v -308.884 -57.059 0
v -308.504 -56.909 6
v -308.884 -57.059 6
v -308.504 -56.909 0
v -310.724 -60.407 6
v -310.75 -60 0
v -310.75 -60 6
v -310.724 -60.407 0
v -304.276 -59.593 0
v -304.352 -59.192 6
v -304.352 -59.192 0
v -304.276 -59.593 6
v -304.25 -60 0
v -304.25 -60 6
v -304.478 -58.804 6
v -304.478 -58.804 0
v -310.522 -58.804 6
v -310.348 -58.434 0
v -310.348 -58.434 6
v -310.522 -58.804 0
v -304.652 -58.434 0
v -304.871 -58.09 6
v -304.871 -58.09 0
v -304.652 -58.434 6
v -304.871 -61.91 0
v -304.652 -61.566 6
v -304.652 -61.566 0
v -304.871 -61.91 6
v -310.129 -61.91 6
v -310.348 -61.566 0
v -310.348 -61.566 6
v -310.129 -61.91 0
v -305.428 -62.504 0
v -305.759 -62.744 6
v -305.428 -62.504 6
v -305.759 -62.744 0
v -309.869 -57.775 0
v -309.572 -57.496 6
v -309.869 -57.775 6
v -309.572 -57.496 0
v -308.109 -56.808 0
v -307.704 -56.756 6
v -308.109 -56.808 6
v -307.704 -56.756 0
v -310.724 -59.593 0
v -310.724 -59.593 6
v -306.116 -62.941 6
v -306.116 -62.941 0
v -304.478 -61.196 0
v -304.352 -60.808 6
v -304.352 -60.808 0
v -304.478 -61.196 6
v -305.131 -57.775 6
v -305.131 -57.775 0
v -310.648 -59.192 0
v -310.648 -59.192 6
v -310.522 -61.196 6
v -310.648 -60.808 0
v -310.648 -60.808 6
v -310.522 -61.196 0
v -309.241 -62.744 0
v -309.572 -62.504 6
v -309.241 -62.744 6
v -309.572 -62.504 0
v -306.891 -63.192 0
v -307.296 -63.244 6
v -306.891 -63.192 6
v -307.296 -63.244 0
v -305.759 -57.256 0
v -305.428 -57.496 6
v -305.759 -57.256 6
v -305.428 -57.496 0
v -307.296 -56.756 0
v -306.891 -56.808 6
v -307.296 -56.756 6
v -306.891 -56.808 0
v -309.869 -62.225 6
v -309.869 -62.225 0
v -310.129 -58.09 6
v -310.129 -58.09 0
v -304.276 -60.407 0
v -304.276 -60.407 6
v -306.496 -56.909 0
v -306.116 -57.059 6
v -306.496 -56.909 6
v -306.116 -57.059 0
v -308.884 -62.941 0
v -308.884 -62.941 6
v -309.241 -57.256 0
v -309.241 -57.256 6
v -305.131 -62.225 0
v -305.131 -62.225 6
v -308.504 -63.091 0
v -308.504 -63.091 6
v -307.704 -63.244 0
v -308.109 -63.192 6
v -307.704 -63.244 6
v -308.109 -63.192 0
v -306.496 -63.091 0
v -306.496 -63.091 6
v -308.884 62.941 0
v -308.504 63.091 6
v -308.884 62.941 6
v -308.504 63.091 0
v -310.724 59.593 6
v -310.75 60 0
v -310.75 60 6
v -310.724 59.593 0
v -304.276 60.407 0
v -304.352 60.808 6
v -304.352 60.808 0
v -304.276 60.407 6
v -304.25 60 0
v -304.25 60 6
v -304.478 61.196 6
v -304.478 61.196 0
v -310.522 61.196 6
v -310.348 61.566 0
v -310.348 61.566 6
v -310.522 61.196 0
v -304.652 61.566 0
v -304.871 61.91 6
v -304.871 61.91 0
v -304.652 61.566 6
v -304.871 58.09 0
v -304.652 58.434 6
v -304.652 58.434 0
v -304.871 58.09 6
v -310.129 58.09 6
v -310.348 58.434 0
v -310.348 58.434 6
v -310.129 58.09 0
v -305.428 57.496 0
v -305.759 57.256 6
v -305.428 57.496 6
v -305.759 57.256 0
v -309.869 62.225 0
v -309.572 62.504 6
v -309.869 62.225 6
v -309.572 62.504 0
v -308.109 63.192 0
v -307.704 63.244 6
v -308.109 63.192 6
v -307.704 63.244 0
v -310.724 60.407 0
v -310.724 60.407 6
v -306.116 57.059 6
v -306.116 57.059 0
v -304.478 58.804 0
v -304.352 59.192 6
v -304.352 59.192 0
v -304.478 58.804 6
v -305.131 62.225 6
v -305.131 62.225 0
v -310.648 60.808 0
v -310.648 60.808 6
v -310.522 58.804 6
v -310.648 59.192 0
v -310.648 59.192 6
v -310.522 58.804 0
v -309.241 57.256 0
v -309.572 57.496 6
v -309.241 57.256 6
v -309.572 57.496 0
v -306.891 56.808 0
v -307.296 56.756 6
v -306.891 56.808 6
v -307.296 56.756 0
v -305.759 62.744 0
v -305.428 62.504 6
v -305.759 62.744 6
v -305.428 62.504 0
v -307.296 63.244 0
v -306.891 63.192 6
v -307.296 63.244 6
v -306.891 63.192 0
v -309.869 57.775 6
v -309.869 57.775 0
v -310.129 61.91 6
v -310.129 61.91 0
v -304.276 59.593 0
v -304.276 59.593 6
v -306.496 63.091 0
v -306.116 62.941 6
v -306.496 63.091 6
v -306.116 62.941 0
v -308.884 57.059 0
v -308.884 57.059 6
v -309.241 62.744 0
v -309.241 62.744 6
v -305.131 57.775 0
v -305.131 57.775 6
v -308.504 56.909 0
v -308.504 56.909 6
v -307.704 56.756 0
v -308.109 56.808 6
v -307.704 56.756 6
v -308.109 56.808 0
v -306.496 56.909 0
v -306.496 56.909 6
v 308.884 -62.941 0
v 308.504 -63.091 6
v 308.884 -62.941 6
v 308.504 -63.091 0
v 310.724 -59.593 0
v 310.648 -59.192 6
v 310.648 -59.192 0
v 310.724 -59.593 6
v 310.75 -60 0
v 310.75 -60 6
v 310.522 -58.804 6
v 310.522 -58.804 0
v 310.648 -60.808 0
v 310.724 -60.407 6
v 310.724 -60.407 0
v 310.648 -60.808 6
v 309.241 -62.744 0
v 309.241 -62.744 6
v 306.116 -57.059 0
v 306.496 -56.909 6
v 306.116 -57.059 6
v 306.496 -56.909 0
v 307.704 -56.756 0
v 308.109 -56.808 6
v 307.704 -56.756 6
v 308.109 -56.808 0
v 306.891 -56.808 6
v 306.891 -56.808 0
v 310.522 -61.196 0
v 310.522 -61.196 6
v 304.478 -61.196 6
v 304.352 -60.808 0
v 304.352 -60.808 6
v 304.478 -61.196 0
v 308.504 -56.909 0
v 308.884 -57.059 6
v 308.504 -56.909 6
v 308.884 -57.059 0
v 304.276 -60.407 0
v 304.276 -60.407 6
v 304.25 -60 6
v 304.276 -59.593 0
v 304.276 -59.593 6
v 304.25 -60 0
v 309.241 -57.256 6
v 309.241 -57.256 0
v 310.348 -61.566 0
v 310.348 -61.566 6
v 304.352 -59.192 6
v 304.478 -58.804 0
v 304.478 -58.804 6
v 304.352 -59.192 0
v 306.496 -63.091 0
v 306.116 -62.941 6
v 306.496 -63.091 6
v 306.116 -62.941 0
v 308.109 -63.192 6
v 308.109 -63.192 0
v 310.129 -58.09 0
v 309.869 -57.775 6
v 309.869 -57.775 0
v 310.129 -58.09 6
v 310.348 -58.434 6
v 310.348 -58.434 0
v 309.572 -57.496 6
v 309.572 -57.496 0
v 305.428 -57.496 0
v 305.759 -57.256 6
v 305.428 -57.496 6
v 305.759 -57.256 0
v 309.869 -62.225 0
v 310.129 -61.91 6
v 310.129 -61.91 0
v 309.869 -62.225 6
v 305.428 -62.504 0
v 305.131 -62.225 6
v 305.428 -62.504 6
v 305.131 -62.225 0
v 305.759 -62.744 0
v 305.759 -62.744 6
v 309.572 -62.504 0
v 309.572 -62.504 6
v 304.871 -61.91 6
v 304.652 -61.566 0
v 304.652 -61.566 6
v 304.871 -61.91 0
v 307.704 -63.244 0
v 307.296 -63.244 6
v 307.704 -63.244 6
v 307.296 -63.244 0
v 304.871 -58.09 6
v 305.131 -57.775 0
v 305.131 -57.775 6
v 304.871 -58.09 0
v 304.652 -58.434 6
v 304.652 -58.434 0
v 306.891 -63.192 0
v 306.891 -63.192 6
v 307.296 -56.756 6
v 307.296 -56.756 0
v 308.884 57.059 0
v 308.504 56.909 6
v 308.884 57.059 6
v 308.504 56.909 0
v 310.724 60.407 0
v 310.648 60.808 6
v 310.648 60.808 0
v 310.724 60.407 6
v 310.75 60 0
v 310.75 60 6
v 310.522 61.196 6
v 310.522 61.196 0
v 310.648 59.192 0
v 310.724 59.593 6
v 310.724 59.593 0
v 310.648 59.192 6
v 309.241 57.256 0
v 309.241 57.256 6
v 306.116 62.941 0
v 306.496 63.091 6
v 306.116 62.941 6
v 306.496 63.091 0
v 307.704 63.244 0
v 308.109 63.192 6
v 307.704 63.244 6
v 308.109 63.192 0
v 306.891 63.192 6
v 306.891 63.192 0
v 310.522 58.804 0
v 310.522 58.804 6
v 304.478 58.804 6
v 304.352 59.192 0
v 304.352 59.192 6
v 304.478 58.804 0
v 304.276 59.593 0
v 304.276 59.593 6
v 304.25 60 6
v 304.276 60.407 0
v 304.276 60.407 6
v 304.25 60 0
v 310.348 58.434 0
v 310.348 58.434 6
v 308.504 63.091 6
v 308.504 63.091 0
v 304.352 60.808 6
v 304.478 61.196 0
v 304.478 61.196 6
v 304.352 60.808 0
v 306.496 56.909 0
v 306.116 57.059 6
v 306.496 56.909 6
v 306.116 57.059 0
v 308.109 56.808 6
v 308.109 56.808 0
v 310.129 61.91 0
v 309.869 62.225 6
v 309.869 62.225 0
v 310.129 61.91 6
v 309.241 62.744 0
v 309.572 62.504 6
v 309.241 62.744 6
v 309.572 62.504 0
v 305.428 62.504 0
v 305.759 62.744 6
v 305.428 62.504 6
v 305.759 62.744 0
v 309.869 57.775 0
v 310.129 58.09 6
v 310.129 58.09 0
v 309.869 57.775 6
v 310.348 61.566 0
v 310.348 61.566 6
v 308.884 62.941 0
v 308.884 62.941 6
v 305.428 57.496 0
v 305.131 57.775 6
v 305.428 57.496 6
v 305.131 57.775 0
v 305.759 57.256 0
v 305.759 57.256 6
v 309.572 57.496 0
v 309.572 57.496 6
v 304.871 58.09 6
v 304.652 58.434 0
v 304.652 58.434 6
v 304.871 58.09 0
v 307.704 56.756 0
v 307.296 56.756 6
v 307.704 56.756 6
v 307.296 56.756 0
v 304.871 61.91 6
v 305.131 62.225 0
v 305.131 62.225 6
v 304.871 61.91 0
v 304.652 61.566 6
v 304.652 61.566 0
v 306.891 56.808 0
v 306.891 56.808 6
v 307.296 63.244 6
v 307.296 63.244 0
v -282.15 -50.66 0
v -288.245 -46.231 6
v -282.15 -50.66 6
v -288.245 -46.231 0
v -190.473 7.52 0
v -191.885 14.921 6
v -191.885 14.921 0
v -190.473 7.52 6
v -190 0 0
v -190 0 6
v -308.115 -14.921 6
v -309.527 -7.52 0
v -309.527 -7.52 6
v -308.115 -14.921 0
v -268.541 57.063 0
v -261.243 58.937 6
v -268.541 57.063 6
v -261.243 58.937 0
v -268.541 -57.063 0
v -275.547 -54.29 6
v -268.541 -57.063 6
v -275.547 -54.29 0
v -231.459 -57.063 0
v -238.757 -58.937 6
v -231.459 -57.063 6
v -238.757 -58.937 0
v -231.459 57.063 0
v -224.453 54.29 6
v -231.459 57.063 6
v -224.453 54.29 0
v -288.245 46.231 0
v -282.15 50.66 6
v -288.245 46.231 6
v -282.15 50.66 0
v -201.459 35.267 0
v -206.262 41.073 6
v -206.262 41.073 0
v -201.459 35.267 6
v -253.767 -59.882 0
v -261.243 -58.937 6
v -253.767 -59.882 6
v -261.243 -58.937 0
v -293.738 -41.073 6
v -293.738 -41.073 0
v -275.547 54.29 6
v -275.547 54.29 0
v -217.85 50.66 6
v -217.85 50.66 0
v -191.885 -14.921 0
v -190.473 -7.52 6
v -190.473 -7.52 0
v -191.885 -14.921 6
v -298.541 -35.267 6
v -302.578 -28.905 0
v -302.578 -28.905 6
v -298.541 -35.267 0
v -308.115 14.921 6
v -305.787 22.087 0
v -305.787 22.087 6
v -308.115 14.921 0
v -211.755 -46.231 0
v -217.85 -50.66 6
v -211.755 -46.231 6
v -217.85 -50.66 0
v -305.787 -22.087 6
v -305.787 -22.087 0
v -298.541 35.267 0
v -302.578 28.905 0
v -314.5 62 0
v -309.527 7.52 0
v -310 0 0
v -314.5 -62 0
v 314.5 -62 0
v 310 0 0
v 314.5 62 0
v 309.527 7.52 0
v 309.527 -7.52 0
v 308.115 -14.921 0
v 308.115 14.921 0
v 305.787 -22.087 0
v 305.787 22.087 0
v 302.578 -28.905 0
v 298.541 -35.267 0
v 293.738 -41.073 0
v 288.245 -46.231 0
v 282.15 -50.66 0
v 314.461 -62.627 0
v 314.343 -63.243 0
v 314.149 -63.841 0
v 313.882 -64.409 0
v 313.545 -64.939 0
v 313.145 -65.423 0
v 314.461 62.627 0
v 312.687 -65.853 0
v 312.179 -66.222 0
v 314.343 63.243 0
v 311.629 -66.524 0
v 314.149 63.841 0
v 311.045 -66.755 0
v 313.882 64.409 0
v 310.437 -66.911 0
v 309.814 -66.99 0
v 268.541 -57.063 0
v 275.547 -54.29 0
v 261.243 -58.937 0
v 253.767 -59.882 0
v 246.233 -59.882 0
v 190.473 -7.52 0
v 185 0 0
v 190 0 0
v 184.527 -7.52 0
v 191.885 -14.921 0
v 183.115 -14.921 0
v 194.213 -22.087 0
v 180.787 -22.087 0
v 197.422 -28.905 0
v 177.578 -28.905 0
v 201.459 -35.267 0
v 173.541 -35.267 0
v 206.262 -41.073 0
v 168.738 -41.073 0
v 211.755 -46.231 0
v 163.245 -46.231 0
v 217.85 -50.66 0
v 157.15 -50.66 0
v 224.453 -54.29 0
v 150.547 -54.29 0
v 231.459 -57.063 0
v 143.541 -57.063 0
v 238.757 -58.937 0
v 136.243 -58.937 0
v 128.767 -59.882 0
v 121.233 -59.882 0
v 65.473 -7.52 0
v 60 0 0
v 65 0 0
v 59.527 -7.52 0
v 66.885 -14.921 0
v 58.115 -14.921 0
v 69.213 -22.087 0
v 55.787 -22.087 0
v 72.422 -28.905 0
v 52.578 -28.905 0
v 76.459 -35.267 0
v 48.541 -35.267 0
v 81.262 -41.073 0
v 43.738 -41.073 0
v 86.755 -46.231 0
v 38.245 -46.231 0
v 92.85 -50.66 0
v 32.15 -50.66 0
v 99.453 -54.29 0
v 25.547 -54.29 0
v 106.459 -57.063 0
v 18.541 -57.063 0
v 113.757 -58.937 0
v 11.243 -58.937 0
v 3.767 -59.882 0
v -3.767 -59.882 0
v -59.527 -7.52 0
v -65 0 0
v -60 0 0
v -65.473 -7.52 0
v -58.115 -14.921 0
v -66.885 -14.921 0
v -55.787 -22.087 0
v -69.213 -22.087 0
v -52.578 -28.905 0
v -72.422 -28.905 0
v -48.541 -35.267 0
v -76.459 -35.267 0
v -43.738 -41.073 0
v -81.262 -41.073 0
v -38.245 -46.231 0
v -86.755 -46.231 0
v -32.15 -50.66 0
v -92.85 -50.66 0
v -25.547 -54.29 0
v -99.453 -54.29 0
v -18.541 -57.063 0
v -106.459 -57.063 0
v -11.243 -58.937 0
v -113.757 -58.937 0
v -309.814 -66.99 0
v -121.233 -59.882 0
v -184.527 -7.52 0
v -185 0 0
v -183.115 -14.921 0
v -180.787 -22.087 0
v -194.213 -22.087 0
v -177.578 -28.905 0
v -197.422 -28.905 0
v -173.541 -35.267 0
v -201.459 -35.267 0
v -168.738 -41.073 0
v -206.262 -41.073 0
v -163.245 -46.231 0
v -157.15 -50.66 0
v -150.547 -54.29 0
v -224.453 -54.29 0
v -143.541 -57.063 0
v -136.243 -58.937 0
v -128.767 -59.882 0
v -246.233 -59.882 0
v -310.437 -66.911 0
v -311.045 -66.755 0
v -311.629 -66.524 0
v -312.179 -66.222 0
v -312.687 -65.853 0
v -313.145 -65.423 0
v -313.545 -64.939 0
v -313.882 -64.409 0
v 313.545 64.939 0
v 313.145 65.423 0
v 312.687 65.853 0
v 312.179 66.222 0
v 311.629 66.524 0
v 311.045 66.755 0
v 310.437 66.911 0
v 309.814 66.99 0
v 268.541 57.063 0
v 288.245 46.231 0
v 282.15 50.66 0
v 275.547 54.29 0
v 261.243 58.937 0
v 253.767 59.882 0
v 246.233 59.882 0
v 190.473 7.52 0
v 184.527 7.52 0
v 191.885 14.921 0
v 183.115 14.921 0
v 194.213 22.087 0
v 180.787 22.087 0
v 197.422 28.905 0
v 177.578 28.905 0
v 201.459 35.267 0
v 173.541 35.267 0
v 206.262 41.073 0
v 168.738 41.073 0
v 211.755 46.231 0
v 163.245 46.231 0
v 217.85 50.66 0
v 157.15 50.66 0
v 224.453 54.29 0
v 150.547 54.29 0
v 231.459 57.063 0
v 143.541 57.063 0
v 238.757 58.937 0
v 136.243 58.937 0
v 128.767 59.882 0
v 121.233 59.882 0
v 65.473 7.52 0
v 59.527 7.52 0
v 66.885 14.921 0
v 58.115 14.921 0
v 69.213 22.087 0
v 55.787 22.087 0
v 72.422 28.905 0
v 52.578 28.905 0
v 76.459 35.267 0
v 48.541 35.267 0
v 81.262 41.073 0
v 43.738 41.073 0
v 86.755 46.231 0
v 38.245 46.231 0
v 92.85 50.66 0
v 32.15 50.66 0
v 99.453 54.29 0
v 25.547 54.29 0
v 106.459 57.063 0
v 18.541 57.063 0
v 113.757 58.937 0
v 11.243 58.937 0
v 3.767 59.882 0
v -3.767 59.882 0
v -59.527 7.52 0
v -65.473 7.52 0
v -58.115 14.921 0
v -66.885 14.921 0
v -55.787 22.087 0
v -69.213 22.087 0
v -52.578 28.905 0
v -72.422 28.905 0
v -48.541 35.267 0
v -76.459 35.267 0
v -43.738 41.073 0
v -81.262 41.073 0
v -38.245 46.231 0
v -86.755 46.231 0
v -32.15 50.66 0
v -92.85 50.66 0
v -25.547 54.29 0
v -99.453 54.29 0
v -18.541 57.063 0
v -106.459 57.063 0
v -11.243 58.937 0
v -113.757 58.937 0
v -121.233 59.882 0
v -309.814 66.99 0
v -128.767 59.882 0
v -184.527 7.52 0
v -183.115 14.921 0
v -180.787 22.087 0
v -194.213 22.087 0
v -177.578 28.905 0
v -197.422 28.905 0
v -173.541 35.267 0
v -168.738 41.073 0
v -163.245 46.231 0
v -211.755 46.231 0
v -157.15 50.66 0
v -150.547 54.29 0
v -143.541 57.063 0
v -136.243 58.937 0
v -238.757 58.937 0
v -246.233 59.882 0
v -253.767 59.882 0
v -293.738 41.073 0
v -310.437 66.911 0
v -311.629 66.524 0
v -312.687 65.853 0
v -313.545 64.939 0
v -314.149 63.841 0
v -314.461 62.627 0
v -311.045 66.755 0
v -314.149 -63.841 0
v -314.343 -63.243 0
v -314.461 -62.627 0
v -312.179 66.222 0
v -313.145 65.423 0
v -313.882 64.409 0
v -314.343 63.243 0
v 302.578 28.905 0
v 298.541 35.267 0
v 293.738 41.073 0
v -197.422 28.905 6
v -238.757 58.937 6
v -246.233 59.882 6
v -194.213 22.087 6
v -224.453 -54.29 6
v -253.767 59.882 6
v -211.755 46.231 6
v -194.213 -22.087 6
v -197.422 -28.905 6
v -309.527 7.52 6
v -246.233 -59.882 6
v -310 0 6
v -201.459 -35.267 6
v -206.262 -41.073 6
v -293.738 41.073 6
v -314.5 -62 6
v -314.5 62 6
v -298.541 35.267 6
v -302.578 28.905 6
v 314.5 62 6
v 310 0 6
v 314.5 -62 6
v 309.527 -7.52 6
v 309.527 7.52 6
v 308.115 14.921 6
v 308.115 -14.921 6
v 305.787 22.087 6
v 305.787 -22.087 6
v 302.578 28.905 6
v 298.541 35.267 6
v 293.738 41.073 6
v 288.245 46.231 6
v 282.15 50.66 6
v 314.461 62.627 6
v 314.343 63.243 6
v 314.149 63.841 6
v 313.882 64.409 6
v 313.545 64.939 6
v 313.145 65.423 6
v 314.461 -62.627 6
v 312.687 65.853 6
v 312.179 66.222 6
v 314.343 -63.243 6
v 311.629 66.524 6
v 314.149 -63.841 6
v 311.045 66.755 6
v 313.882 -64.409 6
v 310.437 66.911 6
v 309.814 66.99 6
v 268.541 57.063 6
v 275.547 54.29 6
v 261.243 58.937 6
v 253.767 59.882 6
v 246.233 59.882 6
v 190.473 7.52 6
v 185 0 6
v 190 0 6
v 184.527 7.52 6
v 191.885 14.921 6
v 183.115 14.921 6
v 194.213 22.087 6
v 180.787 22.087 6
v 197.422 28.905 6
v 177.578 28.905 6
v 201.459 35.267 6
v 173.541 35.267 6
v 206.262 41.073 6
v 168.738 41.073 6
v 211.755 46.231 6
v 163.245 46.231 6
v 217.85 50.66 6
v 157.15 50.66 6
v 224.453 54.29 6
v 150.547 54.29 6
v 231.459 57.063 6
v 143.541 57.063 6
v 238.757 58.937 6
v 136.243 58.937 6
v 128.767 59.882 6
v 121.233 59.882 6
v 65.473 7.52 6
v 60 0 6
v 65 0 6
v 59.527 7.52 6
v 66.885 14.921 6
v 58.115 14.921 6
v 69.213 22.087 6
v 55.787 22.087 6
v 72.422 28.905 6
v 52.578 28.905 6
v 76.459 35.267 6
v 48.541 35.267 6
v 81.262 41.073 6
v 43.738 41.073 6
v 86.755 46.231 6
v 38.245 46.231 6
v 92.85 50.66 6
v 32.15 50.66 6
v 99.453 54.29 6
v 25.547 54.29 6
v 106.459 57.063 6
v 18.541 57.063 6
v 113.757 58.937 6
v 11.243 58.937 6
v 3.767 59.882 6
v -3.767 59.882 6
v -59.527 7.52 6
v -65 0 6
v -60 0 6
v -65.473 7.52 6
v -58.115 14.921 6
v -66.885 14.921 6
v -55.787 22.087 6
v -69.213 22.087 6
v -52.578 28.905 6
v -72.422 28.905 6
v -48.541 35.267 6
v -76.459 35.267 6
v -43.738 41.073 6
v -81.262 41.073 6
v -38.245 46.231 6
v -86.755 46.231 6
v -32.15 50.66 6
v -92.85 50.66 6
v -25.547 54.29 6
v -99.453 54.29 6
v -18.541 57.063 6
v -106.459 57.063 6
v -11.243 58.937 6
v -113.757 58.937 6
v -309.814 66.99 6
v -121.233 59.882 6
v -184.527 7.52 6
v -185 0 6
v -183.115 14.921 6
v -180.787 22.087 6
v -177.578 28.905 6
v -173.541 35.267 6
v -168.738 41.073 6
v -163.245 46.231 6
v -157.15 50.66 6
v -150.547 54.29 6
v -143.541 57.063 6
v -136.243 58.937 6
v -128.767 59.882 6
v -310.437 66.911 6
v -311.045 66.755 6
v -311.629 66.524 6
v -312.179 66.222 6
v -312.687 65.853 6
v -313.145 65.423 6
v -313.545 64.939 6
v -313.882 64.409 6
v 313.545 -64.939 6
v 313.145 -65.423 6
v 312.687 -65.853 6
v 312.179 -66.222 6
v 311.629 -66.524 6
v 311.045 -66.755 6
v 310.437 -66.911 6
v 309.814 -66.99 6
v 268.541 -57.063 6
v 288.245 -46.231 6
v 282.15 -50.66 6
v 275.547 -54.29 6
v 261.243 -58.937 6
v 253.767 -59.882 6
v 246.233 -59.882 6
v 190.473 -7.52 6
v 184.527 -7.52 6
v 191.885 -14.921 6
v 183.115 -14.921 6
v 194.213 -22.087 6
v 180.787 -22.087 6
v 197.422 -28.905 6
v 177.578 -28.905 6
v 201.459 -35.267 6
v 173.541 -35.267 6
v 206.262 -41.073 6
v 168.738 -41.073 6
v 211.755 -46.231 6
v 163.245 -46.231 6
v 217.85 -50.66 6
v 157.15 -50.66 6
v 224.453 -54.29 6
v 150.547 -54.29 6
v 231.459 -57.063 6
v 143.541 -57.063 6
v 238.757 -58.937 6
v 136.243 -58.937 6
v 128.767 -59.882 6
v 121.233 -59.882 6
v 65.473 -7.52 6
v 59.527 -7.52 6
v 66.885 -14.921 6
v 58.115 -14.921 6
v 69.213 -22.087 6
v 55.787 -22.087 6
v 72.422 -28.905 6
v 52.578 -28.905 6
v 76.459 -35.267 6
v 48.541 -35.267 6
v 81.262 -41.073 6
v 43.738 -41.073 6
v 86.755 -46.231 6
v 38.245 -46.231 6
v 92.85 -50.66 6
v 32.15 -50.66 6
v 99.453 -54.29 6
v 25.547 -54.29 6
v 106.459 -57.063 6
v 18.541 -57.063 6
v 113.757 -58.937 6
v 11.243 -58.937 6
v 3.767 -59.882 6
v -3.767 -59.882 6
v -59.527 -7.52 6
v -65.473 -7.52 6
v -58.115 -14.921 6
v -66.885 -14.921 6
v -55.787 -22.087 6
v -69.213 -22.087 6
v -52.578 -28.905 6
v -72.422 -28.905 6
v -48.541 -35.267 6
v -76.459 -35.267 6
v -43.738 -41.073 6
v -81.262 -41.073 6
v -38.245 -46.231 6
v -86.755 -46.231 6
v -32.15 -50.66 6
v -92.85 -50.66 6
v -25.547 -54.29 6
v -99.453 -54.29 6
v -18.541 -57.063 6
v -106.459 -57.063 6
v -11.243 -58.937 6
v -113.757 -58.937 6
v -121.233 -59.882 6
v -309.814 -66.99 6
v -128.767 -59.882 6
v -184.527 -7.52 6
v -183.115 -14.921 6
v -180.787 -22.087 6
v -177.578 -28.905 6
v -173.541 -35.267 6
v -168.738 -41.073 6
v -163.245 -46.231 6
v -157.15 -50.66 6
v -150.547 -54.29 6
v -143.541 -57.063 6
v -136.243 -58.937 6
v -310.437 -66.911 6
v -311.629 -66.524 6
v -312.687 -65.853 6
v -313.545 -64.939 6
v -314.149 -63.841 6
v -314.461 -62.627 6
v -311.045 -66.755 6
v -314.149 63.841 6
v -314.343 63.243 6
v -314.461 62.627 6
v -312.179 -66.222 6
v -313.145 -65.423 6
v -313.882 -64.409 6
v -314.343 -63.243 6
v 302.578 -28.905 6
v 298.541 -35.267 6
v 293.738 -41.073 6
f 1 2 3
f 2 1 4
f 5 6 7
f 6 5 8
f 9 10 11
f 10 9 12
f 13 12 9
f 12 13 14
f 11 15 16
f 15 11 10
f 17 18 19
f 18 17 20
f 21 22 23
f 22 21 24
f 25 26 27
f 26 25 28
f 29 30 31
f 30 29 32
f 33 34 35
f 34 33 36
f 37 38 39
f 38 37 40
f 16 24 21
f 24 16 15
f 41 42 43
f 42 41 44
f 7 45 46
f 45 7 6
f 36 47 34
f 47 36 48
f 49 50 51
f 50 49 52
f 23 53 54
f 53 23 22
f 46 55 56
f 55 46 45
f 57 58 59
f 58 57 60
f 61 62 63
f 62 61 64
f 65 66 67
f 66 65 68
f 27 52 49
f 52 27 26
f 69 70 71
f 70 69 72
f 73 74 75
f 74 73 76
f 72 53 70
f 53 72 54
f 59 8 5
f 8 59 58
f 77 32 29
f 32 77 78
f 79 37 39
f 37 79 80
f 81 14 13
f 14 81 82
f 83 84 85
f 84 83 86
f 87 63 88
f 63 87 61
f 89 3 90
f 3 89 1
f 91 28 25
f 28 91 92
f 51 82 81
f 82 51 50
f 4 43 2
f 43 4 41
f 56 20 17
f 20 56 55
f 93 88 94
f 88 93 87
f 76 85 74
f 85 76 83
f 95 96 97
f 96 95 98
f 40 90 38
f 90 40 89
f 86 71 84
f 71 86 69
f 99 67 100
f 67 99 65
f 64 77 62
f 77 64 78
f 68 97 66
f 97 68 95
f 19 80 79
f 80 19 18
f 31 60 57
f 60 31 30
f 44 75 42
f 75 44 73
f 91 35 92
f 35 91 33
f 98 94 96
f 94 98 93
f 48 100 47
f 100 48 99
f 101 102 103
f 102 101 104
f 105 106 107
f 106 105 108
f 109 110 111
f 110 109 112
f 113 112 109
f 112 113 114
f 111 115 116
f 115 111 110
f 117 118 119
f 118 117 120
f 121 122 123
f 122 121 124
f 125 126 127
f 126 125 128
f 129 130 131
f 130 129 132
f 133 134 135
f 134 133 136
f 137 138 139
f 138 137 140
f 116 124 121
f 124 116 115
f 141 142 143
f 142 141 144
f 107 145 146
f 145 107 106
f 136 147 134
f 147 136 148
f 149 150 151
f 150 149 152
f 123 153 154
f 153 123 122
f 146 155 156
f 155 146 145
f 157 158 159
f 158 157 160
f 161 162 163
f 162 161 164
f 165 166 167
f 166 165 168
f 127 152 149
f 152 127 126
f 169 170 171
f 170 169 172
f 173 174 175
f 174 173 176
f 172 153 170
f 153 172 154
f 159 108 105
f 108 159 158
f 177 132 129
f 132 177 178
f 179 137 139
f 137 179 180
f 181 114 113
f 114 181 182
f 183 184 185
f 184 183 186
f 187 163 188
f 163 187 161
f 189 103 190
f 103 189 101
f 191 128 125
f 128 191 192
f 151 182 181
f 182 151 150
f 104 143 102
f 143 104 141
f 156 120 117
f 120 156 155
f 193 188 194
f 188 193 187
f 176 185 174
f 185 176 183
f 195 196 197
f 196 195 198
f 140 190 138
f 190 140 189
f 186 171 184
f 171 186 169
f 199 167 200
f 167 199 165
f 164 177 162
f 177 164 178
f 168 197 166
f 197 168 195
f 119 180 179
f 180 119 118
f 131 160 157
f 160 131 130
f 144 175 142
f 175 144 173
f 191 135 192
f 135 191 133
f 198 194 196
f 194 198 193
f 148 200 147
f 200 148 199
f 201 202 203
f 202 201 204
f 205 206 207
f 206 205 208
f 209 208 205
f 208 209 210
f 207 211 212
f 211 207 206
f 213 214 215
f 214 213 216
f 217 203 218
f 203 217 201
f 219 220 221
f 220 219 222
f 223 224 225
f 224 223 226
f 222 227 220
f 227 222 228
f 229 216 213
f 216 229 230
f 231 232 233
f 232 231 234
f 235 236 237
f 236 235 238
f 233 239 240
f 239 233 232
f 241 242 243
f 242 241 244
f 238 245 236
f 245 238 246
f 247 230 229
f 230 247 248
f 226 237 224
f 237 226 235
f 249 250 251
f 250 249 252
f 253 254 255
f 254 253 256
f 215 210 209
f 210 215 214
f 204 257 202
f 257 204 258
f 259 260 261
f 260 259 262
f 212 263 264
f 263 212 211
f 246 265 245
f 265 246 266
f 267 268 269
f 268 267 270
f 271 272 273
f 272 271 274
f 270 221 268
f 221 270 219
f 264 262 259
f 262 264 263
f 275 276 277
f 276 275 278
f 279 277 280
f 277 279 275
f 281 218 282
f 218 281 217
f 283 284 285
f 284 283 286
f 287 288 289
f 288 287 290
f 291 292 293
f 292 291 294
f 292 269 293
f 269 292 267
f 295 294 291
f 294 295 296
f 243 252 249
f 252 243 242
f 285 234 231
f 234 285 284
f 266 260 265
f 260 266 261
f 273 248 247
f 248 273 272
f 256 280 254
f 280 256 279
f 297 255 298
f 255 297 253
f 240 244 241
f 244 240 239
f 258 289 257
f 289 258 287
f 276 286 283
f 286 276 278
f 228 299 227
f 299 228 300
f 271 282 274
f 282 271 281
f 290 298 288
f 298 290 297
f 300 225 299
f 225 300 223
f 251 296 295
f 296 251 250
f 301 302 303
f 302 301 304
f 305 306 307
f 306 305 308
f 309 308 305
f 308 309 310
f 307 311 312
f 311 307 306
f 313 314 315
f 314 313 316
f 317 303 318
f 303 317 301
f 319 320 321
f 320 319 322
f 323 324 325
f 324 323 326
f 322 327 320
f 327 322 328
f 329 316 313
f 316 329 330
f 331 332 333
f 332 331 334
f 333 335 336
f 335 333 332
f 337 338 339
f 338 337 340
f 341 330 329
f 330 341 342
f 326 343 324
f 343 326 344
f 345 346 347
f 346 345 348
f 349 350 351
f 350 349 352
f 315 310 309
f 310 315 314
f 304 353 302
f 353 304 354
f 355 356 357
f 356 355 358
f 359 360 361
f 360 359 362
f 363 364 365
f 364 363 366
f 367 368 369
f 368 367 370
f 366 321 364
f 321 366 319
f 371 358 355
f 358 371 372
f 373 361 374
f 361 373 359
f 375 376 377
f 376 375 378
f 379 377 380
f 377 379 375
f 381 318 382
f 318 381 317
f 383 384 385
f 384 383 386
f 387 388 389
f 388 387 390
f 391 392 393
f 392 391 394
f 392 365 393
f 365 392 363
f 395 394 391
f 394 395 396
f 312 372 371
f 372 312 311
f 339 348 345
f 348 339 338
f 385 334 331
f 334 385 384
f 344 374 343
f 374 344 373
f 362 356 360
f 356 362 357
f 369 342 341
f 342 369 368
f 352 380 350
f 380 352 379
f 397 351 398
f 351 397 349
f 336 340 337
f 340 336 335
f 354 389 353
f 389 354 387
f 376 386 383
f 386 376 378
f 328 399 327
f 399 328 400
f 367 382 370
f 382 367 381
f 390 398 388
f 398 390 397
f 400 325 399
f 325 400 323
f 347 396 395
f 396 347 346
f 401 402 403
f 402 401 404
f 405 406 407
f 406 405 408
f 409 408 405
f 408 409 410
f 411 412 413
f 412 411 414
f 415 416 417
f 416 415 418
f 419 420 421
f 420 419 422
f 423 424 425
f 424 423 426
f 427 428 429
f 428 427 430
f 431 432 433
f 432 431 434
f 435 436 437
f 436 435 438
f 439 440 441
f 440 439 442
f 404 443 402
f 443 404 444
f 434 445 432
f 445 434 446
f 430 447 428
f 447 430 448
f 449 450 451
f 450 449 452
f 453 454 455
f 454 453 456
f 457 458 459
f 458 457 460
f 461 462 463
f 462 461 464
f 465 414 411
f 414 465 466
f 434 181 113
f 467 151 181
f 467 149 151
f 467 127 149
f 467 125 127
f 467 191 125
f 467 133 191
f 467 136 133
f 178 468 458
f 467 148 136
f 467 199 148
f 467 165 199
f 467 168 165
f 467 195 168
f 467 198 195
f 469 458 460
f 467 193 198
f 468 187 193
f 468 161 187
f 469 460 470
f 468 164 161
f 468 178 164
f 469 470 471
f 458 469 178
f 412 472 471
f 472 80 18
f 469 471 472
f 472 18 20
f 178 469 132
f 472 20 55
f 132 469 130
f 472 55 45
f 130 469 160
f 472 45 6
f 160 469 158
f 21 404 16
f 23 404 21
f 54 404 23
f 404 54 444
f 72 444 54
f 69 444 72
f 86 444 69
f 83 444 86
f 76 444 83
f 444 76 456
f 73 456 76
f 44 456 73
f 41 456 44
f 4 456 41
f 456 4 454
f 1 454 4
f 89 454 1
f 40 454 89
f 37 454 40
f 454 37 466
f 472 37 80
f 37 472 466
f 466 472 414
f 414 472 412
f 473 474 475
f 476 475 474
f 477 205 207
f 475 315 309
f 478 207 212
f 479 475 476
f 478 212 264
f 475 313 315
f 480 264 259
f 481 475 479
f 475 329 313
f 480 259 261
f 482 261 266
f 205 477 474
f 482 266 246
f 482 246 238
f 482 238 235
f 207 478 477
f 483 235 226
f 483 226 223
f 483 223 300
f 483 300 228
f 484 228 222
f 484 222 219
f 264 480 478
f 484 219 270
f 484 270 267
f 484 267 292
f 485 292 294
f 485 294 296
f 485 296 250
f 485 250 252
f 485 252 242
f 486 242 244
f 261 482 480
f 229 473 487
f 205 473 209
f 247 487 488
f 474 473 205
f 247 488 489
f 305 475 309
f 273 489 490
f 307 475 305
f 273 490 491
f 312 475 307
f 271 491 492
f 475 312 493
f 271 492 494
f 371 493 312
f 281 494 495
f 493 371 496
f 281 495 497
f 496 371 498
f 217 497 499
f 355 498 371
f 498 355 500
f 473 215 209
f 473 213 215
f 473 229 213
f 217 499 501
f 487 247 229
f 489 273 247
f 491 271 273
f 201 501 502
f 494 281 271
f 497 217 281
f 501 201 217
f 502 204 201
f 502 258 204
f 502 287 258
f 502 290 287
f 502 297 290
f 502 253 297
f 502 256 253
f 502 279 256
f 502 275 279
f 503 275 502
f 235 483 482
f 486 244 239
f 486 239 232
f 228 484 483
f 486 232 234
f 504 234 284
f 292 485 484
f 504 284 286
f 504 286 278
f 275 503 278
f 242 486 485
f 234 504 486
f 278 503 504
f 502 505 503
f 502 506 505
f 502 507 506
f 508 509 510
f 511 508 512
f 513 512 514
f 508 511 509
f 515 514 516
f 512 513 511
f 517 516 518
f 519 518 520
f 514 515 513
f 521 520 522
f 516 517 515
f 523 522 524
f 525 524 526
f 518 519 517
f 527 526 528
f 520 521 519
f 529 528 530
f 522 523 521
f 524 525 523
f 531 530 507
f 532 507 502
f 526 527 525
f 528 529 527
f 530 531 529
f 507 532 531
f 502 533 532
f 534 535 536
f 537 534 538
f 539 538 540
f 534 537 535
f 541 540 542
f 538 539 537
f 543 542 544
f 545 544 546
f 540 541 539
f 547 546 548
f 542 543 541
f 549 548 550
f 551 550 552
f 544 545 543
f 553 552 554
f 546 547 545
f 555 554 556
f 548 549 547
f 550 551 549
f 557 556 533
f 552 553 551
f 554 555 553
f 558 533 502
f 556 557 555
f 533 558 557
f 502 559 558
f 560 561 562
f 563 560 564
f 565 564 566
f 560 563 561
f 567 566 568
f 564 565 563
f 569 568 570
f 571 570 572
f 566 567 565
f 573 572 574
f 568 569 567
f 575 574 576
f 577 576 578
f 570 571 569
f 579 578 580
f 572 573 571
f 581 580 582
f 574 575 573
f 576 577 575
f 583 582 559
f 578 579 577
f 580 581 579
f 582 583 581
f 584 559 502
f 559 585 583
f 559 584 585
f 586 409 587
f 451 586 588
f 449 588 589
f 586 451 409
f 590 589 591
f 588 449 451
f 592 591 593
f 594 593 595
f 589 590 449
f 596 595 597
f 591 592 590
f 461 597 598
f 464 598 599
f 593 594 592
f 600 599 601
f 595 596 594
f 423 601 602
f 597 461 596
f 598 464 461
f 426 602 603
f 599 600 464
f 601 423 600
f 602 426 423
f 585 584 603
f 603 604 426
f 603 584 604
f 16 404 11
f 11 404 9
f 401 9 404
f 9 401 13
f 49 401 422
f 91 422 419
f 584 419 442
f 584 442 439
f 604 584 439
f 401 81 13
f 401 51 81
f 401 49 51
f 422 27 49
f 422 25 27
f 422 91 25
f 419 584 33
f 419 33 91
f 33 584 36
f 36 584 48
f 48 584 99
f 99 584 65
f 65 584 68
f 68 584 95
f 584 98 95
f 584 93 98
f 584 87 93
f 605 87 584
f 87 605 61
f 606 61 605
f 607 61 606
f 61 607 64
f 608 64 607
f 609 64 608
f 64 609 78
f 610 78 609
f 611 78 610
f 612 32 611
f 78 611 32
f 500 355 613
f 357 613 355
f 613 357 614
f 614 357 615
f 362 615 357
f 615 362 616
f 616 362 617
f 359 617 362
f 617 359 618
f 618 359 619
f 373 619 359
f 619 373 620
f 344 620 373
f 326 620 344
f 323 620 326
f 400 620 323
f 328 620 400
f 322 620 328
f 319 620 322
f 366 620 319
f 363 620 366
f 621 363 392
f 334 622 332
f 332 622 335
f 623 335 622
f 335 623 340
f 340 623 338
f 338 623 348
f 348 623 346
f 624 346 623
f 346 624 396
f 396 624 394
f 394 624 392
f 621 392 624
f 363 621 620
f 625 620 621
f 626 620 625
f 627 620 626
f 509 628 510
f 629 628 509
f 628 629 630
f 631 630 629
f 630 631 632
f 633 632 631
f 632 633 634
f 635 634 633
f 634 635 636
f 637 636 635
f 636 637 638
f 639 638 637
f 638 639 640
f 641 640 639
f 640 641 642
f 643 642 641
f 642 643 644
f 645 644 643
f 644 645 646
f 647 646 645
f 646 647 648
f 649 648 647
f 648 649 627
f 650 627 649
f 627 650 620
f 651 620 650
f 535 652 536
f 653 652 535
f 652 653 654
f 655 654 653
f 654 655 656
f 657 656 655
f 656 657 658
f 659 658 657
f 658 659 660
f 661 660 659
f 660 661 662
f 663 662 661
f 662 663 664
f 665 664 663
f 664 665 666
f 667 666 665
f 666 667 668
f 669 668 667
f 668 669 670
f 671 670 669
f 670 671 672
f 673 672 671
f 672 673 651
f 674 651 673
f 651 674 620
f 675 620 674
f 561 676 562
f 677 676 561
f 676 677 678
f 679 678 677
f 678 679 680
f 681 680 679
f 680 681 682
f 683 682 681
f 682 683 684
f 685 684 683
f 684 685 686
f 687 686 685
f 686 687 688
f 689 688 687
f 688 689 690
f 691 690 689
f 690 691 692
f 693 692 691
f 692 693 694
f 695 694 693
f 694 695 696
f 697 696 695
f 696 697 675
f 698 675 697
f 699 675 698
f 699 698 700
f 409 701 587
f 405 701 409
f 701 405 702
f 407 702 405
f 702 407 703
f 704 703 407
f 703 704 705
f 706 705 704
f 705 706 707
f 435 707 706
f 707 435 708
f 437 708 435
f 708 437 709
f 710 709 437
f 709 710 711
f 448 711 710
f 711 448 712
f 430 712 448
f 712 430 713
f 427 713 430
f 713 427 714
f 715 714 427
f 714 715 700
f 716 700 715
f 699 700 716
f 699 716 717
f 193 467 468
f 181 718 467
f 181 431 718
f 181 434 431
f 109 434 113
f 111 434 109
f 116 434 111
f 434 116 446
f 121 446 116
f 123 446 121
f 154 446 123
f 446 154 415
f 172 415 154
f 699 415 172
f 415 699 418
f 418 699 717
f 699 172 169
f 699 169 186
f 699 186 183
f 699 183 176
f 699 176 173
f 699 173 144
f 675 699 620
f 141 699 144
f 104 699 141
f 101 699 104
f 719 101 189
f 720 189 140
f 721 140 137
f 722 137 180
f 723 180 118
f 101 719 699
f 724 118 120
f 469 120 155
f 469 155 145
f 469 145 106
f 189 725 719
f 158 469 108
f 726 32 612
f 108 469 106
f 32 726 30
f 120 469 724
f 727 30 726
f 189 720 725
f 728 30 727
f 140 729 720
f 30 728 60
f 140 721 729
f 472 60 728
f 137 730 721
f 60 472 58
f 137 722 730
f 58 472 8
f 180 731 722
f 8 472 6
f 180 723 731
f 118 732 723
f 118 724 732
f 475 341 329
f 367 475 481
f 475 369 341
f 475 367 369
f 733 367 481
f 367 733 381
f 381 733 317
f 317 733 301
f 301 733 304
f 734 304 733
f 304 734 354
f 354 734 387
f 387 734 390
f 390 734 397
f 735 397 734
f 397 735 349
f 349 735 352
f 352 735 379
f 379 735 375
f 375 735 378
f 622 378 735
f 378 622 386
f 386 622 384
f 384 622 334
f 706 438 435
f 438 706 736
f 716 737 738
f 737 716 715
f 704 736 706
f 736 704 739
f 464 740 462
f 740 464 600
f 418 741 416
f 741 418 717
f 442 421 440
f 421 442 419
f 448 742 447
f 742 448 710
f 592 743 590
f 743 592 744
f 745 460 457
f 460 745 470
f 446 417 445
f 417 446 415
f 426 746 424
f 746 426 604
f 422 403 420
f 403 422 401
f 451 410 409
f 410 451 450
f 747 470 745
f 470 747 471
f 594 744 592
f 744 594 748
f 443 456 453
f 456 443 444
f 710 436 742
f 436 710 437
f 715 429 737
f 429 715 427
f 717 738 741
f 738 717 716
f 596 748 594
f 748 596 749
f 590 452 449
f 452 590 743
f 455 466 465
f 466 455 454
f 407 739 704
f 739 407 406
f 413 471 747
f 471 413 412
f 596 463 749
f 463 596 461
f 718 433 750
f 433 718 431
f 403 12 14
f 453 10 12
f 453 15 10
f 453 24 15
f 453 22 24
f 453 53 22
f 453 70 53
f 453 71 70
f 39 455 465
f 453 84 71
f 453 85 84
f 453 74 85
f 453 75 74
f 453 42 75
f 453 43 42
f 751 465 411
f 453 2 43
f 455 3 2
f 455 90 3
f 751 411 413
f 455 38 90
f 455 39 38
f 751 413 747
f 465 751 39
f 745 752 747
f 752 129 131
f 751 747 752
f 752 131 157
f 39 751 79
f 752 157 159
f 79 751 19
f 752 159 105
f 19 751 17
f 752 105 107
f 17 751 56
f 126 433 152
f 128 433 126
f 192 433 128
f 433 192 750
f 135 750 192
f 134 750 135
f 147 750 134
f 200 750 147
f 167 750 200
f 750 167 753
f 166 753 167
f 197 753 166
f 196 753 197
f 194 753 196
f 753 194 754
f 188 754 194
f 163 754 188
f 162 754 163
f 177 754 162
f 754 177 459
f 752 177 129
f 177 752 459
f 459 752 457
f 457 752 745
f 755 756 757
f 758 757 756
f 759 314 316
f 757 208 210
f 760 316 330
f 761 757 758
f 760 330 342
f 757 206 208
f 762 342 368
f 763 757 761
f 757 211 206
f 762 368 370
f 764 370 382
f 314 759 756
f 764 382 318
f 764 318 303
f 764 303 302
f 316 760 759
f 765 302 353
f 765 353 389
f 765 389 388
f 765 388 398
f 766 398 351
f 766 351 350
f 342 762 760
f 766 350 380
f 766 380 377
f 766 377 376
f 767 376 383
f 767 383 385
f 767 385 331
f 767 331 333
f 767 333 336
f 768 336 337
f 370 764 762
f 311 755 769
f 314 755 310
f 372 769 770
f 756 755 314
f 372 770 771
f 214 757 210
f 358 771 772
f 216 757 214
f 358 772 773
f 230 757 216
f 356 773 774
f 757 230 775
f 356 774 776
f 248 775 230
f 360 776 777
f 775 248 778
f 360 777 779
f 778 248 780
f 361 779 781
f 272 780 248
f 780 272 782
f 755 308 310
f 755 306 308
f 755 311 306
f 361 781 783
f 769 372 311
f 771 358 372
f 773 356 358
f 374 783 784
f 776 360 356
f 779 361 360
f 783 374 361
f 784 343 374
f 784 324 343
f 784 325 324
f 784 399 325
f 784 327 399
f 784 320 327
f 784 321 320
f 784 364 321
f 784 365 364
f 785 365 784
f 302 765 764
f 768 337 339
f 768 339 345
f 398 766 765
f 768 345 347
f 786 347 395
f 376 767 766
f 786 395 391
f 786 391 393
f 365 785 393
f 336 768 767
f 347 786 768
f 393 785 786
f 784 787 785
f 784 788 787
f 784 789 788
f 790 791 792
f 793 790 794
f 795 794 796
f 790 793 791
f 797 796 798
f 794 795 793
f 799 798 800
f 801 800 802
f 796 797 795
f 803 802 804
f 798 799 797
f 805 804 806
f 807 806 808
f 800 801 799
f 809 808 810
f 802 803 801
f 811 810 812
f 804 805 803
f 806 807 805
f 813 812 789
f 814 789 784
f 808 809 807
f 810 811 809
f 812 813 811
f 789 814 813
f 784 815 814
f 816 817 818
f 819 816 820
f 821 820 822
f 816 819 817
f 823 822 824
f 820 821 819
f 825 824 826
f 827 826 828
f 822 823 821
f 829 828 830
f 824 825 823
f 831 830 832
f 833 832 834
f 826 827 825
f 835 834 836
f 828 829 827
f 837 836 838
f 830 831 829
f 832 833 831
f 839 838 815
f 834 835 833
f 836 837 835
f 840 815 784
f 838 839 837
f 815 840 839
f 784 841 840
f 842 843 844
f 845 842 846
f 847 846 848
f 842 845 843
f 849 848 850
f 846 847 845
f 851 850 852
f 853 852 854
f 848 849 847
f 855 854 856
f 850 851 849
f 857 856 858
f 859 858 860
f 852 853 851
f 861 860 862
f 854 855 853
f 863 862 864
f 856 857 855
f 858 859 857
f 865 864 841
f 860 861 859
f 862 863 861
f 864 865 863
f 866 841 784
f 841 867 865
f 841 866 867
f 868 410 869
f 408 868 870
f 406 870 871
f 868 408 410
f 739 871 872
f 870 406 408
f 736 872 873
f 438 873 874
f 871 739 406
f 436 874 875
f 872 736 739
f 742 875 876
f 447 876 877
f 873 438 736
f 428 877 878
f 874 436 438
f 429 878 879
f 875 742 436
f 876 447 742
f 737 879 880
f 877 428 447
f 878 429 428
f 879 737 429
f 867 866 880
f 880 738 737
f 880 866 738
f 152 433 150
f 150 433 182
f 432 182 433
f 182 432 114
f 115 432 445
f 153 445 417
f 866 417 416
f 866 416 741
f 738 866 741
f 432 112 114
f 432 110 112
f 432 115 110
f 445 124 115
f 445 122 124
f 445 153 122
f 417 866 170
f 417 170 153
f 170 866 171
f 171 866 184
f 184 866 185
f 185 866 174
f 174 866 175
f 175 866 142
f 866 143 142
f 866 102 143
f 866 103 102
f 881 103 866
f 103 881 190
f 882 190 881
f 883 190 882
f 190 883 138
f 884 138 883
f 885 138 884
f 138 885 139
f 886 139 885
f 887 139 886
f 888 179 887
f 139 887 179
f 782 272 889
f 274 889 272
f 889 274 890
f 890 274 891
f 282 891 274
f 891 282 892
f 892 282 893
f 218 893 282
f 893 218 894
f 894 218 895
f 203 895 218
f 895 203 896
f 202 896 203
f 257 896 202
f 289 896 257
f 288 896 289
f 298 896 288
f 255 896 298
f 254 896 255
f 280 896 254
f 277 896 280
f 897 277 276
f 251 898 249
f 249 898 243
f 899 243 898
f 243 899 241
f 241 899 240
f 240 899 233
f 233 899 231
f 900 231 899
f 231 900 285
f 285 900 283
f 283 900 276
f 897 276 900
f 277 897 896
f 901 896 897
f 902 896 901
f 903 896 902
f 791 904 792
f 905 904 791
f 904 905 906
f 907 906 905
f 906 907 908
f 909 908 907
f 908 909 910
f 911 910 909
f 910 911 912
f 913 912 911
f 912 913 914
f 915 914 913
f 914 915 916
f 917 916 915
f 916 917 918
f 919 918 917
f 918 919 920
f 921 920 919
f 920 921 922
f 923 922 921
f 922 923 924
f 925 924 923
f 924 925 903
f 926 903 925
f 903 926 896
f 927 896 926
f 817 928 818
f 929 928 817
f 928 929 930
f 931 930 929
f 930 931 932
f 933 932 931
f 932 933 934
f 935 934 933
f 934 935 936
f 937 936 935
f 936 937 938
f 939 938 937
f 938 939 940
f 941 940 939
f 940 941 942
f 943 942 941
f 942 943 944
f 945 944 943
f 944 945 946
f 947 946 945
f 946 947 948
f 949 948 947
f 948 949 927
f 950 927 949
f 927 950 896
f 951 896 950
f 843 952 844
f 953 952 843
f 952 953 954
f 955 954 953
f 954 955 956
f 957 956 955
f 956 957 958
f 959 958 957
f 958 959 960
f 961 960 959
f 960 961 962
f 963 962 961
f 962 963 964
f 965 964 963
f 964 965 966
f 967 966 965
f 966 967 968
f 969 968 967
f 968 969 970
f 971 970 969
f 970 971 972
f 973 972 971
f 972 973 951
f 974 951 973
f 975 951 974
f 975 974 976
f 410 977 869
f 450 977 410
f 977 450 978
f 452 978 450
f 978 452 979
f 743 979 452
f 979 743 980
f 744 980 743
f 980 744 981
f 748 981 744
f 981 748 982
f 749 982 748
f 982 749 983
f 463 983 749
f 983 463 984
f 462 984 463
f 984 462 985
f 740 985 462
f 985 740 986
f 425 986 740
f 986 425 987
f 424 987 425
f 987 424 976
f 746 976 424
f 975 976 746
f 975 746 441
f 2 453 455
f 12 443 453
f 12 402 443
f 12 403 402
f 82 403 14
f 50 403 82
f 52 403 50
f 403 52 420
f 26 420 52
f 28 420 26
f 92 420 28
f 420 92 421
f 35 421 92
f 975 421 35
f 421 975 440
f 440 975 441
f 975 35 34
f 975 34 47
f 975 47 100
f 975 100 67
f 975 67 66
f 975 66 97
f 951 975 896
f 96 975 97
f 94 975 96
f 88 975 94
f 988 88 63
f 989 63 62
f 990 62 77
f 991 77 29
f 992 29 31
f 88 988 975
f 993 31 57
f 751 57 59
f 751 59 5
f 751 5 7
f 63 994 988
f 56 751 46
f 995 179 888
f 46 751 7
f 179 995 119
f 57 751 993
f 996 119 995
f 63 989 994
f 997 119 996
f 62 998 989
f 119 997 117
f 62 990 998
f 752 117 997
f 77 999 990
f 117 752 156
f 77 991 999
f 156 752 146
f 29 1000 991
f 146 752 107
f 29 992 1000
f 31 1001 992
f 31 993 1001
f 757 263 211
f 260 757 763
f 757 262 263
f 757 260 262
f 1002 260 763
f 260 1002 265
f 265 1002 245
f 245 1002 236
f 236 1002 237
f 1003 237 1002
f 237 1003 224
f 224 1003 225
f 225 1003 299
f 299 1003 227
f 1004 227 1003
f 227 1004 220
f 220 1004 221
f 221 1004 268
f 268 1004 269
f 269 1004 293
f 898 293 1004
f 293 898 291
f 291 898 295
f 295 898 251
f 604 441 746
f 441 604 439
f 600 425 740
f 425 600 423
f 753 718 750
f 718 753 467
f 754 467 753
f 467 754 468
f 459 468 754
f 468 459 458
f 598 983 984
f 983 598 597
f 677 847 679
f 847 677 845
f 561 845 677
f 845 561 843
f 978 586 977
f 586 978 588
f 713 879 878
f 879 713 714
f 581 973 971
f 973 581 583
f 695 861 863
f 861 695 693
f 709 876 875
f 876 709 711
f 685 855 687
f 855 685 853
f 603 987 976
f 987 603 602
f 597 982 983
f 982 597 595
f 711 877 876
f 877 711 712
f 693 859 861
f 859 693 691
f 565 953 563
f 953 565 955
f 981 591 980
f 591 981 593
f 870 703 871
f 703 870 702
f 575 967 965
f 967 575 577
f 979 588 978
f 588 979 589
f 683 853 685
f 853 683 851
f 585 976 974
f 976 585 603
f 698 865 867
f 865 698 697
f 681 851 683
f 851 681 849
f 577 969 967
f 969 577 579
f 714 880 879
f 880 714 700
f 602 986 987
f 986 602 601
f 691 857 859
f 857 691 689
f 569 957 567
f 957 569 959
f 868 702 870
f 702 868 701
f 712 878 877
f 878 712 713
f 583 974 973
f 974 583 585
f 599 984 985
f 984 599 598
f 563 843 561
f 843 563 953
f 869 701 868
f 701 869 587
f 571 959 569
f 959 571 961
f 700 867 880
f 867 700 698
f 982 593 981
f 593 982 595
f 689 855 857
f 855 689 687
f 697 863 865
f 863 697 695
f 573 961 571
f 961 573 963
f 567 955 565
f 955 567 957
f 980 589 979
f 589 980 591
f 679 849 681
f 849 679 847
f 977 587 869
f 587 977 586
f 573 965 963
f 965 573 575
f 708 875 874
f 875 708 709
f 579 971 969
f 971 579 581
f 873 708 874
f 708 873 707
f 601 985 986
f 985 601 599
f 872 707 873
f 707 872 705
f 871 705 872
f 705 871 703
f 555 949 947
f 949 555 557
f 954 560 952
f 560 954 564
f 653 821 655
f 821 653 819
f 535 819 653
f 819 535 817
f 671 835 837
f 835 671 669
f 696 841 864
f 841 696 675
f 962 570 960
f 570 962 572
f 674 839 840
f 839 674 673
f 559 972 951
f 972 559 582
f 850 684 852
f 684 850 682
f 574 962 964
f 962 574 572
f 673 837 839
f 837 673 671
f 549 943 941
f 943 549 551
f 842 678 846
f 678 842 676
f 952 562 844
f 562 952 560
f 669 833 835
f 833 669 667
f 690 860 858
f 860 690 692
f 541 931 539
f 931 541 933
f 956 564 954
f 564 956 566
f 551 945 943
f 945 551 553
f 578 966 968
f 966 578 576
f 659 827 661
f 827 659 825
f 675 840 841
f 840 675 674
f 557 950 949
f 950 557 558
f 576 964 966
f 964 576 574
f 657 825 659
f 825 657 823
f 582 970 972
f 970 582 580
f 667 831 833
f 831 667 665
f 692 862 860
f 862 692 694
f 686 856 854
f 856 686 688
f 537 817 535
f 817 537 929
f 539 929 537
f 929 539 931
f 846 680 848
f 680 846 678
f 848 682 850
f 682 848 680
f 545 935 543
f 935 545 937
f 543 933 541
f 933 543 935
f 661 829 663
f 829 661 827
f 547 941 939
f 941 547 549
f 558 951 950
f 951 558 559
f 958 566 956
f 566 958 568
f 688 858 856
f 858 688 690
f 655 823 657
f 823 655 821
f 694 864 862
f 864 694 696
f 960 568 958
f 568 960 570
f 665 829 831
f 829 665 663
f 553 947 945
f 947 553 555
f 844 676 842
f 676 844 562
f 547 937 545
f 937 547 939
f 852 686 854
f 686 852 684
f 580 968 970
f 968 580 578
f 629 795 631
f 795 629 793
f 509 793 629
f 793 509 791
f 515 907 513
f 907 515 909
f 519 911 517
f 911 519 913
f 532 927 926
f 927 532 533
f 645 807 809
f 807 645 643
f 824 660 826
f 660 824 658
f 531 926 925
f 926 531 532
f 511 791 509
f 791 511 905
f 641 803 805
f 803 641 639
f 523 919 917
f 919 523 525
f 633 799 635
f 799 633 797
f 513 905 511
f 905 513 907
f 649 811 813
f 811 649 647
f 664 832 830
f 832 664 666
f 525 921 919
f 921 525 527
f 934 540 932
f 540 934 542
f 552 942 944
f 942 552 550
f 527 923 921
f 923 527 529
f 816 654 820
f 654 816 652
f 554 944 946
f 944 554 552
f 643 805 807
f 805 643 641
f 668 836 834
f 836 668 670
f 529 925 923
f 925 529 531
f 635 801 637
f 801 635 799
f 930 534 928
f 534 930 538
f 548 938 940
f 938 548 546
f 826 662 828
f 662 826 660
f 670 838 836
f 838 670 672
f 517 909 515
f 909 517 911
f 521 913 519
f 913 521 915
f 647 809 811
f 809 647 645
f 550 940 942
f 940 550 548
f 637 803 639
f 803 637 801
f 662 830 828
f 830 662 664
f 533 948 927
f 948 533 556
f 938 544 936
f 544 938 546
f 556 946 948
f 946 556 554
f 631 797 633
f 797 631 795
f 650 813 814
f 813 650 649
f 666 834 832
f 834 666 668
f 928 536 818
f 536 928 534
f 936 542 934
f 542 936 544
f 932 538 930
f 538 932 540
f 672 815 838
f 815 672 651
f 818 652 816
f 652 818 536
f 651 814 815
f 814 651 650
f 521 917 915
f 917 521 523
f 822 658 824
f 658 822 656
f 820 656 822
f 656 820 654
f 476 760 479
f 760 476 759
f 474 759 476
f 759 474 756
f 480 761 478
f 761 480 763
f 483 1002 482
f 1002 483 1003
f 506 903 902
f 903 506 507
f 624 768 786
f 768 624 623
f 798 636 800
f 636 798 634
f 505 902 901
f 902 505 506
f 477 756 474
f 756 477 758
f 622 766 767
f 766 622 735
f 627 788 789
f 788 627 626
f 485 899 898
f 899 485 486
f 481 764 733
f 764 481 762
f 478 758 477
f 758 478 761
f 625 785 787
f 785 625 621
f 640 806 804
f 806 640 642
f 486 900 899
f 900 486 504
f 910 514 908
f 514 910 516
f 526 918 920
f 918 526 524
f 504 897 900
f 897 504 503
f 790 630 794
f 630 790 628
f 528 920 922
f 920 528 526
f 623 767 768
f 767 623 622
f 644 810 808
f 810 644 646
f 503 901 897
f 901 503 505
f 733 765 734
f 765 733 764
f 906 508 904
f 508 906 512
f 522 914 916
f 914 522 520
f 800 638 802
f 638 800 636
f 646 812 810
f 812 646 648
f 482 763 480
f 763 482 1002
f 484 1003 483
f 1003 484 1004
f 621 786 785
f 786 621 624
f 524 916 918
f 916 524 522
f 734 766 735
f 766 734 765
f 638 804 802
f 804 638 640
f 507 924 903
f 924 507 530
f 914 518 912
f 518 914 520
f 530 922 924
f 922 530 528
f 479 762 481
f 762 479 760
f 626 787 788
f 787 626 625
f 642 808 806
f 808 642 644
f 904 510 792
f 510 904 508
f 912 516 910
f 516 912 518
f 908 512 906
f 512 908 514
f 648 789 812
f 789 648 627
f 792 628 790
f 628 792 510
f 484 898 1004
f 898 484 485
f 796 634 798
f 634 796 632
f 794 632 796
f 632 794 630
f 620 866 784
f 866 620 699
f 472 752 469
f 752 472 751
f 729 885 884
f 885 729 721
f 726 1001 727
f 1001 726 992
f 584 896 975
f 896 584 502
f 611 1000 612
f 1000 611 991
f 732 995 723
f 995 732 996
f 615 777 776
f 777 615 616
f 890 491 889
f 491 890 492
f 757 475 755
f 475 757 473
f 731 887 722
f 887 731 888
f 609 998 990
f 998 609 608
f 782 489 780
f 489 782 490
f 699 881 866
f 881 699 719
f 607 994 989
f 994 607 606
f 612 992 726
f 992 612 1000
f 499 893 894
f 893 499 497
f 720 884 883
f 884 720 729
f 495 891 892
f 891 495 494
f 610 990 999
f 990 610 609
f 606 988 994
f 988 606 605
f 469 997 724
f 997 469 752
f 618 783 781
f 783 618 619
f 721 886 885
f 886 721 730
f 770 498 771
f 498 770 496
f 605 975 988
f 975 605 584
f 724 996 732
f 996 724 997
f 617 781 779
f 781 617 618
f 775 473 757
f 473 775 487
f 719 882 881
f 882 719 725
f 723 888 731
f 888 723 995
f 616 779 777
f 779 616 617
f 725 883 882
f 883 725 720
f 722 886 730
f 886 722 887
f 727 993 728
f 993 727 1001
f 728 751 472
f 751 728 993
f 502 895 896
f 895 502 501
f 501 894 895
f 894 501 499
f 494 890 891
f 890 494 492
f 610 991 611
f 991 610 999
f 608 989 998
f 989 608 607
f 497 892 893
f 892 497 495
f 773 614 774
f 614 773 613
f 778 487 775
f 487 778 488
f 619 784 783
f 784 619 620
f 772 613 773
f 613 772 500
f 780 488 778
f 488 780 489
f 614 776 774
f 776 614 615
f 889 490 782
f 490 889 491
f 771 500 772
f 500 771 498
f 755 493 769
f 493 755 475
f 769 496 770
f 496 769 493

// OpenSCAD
$fn = 50;

difference() {
	union() {
		hull() {
			translate(v = [-309.5, 62.0, 0]) {
				cylinder(h = 6, r = 5);
			}
			translate(v = [309.5, 62.0, 0]) {
				cylinder(h = 6, r = 5);
			}
			translate(v = [-309.5, -62.0, 0]) {
				cylinder(h = 6, r = 5);
			}
			translate(v = [309.5, -62.0, 0]) {
				cylinder(h = 6, r = 5);
			}
		}
	}
	union() {
		translate(v = [-307.5, -60.0, -100.0]) {
			cylinder(h = 200, r = 3.25);
		}
		translate(v = [-307.5, 60.0, -100.0]) {
			cylinder(h = 200, r = 3.25);
		}
		translate(v = [307.5, -60.0, -100.0]) {
			cylinder(h = 200, r = 3.25);
		}
		translate(v = [307.5, 60.0, -100.0]) {
			cylinder(h = 200, r = 3.25);
		}
		translate(v = [-307.5, -60.0, -100.0]) {
			cylinder(h = 200, r = 1.8);
		}
		translate(v = [-307.5, 60.0, -100.0]) {
			cylinder(h = 200, r = 1.8);
		}
		translate(v = [307.5, -60.0, -100.0]) {
			cylinder(h = 200, r = 1.8);
		}
		translate(v = [307.5, 60.0, -100.0]) {
			cylinder(h = 200, r = 1.8);
		}
		translate(v = [-250.0, 0, 0.0]) {
			cylinder(h = 6, r = 60.0);
		}
		translate(v = [-125.0, 0, 0.0]) {
			cylinder(h = 6, r = 60.0);
		}
		cylinder(h = 6, r = 60.0);
		translate(v = [125.0, 0, 0.0]) {
			cylinder(h = 6, r = 60.0);
		}
		translate(v = [250.0, 0, 0.0]) {
			cylinder(h = 6, r = 60.0);
		}
	}
}
